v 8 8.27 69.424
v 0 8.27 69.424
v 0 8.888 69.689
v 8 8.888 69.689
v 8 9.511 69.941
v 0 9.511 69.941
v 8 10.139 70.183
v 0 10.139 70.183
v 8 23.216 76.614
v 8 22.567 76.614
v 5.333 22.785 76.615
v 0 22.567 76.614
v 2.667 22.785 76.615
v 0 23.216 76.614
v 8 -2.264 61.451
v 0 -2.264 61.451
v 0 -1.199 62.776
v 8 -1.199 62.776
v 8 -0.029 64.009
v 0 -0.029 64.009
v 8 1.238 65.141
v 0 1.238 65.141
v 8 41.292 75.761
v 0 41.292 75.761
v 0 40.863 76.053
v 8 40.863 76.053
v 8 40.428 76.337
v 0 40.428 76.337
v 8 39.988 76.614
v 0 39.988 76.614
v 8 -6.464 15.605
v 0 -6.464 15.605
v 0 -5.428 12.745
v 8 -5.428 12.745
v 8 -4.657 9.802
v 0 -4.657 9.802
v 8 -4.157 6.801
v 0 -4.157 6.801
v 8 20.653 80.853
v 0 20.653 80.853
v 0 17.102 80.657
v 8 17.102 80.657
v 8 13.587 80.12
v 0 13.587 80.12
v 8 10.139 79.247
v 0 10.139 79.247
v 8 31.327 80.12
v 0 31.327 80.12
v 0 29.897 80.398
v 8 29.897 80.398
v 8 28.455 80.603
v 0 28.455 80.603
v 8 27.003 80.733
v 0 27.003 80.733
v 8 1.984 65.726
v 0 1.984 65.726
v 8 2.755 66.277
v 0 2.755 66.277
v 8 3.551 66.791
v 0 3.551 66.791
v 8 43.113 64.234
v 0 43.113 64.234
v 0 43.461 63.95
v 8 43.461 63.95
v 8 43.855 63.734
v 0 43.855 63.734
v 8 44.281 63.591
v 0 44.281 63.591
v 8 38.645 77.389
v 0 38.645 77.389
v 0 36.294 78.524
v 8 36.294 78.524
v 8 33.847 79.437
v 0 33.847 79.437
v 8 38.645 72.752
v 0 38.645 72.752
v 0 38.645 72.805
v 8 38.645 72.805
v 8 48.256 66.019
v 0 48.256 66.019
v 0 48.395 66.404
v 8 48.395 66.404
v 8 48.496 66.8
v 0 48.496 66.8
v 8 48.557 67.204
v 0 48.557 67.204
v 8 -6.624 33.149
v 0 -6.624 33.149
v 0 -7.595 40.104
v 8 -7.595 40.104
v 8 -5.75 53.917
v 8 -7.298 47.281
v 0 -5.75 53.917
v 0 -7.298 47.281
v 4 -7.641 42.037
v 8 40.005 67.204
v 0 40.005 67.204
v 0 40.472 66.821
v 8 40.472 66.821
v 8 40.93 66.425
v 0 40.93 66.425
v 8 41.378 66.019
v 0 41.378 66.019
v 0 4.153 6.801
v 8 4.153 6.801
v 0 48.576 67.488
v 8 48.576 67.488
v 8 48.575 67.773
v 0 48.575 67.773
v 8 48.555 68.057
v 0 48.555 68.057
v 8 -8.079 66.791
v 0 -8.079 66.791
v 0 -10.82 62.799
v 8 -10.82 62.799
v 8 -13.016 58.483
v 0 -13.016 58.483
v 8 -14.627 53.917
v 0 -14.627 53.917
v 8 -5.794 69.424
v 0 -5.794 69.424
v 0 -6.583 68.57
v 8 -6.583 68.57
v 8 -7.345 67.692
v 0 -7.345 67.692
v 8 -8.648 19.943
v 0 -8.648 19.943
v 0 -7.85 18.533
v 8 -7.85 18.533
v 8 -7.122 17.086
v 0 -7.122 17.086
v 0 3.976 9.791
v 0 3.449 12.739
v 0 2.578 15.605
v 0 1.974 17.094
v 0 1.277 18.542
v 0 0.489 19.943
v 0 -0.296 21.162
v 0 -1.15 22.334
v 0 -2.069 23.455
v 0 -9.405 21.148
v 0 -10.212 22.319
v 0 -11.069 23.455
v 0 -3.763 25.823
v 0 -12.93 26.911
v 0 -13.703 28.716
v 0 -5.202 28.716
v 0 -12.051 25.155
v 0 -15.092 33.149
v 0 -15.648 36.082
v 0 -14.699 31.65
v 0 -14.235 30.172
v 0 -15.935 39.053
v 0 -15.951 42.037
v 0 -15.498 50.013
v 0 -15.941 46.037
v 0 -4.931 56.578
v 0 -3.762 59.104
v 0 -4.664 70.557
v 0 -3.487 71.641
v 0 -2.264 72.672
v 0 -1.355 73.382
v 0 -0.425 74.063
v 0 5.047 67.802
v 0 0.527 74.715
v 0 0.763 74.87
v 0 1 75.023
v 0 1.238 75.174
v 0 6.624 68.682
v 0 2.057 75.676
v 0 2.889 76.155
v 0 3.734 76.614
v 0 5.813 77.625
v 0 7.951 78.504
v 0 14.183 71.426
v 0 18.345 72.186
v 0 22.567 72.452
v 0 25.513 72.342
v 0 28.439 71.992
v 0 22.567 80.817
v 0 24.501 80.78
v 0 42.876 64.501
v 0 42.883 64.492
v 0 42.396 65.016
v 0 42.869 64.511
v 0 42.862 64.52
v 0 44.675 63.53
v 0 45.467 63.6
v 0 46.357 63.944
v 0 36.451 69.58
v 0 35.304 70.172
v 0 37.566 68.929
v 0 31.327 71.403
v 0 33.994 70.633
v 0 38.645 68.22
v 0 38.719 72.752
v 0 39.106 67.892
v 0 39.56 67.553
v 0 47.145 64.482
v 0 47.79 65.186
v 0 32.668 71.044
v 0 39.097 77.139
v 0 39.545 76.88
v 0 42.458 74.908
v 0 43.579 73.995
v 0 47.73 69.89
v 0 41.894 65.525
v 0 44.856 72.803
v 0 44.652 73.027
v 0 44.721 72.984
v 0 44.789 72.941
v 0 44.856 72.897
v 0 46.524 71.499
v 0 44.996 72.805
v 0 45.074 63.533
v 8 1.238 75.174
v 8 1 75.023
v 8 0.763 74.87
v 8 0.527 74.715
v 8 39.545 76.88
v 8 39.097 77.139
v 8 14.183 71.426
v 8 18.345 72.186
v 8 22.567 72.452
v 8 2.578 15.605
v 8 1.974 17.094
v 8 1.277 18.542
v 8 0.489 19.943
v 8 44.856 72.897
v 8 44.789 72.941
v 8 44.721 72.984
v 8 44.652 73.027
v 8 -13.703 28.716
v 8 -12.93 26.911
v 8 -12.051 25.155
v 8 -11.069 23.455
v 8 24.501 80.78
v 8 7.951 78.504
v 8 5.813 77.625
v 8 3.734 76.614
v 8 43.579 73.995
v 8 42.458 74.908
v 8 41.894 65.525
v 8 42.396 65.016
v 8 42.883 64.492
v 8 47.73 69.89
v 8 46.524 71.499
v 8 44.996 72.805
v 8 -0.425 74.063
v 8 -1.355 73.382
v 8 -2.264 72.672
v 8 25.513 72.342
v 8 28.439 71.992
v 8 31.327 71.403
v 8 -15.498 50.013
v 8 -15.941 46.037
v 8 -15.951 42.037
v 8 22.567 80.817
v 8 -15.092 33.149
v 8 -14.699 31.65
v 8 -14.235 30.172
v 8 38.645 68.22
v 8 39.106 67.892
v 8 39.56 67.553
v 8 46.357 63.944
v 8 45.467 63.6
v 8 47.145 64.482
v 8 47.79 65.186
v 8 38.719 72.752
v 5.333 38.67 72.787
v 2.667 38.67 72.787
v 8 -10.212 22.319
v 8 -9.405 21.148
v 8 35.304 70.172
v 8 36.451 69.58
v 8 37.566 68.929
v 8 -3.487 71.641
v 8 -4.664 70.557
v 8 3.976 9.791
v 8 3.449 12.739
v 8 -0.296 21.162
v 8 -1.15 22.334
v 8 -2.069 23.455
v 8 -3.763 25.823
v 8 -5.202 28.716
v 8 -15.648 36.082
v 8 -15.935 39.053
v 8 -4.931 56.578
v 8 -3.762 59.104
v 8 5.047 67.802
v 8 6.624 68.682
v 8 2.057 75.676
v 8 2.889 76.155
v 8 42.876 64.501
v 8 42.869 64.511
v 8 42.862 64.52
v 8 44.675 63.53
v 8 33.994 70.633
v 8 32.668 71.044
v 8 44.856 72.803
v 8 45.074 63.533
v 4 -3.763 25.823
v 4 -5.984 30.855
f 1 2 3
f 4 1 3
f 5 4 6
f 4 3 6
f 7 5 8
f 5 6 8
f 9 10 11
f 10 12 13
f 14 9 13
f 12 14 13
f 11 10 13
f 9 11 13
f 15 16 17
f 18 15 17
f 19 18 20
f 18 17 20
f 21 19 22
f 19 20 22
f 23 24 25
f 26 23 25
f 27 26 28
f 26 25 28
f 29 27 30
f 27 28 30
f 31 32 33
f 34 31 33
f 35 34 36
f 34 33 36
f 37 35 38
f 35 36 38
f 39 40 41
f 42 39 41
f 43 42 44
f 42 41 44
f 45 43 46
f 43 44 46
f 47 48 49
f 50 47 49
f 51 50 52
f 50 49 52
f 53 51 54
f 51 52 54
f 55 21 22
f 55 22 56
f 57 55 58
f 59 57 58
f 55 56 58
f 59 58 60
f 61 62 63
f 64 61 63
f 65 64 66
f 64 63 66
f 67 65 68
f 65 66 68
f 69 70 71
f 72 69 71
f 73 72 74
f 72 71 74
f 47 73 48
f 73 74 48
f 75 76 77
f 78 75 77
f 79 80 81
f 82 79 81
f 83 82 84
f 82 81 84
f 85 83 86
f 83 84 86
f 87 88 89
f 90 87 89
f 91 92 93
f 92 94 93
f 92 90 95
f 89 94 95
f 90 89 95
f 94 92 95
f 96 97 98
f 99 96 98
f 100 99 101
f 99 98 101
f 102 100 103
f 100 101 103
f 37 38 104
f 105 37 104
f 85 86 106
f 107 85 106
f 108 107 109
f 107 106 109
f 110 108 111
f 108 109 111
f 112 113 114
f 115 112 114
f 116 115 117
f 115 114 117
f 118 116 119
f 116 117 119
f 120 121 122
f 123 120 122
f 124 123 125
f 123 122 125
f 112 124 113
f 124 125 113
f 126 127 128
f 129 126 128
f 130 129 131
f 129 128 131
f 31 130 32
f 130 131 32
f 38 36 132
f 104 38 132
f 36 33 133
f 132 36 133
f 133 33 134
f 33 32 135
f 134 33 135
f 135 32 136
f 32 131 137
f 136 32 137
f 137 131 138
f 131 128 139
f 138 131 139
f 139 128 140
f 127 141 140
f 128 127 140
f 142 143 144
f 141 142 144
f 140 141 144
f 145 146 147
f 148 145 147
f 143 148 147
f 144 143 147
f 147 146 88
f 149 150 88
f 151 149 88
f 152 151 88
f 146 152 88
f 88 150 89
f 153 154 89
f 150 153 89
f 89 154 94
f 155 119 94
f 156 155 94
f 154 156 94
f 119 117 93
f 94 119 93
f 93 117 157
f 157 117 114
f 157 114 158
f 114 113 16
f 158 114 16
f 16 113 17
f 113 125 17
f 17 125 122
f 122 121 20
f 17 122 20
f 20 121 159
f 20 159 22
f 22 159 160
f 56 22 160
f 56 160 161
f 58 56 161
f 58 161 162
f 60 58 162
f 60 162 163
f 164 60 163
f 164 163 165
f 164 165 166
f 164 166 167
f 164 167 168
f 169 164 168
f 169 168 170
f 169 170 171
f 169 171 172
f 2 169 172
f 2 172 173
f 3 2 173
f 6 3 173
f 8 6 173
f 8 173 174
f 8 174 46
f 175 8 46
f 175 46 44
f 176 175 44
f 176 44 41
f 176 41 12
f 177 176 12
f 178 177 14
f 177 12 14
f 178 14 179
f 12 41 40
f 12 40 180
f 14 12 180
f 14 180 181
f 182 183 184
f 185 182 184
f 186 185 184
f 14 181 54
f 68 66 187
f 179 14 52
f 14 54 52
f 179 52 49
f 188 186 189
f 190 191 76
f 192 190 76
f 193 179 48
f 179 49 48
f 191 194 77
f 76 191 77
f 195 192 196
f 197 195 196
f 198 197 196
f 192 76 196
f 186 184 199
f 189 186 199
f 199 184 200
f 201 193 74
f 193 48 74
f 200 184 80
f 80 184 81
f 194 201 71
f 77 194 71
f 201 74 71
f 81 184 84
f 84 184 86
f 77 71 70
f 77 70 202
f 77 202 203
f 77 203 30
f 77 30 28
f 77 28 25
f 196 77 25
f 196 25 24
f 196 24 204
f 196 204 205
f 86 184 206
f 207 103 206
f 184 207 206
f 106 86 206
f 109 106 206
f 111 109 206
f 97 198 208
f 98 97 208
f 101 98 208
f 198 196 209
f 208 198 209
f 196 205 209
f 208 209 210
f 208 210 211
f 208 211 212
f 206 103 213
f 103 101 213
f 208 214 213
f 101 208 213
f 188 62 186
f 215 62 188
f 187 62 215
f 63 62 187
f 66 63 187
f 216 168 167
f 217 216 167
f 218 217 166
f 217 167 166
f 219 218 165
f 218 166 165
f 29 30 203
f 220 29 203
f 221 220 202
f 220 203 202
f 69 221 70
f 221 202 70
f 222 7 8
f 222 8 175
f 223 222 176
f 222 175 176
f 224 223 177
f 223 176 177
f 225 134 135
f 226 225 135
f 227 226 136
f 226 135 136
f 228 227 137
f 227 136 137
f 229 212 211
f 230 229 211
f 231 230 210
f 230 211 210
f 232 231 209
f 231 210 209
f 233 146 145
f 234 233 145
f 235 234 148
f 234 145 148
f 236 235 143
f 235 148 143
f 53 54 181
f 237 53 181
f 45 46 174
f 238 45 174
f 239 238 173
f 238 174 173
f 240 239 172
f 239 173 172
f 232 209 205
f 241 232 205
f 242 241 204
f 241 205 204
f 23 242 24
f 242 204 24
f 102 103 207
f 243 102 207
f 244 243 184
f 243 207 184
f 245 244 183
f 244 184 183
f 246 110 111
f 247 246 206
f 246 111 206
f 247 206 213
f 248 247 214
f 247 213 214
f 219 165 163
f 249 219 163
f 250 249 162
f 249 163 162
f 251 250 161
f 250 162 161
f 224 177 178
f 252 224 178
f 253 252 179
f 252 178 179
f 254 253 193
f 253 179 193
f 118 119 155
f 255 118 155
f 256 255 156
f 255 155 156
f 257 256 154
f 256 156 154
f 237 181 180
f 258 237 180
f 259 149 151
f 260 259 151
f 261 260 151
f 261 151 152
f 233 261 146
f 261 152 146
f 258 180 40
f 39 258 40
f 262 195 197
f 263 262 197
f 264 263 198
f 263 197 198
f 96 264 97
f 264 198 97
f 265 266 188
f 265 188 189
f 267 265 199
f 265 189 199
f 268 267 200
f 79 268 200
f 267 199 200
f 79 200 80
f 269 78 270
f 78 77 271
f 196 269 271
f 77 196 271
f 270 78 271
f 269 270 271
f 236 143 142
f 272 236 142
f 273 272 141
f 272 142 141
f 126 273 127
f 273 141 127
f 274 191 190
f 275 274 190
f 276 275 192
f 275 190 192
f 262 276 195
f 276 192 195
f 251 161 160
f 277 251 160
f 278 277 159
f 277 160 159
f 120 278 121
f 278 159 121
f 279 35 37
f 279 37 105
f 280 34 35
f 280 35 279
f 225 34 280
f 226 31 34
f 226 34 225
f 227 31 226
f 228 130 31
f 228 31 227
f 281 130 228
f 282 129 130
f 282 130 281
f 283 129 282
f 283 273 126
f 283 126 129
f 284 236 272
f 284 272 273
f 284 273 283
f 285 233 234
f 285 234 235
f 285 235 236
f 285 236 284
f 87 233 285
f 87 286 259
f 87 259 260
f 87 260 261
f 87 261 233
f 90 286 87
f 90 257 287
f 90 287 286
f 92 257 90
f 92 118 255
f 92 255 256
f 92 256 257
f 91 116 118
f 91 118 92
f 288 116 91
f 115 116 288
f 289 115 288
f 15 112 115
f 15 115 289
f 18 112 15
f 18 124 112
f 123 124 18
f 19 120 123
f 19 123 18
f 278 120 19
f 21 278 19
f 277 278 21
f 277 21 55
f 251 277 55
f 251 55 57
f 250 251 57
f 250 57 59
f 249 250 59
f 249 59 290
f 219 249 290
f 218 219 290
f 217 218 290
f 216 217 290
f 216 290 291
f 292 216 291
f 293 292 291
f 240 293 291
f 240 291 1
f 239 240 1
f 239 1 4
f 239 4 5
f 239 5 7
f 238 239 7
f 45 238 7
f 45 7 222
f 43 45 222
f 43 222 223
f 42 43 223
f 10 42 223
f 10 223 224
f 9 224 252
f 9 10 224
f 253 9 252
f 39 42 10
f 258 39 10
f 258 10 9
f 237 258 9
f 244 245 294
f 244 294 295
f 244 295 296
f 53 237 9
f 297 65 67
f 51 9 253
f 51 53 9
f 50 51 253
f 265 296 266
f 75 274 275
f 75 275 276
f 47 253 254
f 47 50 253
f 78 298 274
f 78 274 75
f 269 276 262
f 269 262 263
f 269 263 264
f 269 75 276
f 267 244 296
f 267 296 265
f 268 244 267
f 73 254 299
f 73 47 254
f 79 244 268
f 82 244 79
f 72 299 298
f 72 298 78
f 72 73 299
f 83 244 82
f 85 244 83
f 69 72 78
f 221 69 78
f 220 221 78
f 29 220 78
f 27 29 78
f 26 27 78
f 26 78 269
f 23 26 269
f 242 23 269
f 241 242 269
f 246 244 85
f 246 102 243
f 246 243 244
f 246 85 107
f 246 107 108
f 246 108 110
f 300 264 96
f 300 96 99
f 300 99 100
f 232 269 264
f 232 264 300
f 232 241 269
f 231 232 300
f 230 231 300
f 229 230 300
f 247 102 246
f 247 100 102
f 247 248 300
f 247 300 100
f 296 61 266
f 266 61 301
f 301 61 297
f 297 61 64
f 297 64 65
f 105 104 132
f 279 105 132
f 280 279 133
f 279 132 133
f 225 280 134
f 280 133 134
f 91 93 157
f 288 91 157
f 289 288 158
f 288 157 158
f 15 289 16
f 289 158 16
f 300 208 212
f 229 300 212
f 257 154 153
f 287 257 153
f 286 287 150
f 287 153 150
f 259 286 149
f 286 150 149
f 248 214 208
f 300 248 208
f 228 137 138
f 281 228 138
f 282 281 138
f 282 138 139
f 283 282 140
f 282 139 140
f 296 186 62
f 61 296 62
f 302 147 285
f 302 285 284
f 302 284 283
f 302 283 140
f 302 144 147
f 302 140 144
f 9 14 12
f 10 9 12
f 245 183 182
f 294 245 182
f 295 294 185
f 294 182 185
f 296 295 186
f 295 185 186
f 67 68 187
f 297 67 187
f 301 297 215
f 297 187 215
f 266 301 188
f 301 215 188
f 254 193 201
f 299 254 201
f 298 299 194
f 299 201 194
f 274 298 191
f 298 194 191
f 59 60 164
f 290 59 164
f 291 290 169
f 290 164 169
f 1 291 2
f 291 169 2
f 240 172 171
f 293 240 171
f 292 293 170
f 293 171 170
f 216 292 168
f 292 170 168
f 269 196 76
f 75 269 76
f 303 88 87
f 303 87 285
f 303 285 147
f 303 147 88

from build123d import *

# Parameters (mm, degrees)
F0_W     = 7.3179761397
F0_H     = 0.852221109
F2_DEPTH = 8


with BuildPart() as f2:
    # F0 (on Right) → F2 (new body)
    with BuildSketch(Plane.YZ):
        with BuildLine():
            Line((-10.1888944263, 53.9168607201), (-5.7503742038, 53.9168607201))
            ThreePointArc((-5.7503742038, 53.9168607201), (-4.3894384073, 57.8607093725), (-2.2639043723, 61.4507223949))
            Line((-2.2639043723, 61.4507223949), (-2.2639043723, 66.7907201963))
            add(Edge.make_bspline(
                [(-10.1888944263, 53.9168607201), (-8.3345715025, 58.6916164824), (-4.5405432149, 63.9948893867), (-2.2639043723, 66.7907201963)],
                knots=[0.4485191098, 0.4485191098, 0.4485191098, 0.4485191098, 0.5436368318, 0.5436368318, 0.5436368318, 0.5436368318], degree=3))
        make_face()
        with BuildLine():
            add(Edge.make_bspline(
                [(-5.7503742038, 53.9168607201), (-7.6414888716, 48.4947767316), (-7.6414888716, 42.0372994525)],
                knots=[4.1382491567, 4.1382491567, 4.1382491567, 4.7123889804, 4.7123889804, 4.7123889804], degree=2, weights=[1, 0.9590776261, 1]))
            Line((-5.7503742038, 53.9168607201), (-10.1888944263, 53.9168607201))
            add(Edge.make_bspline(
                [(-11.7964888716, 42.0372994525), (-11.953273607, 45.832214532), (-11.8401507048, 49.6649877966), (-10.1888944263, 53.9168607201)],
                knots=[0.3638177163, 0.3638177163, 0.3638177163, 0.3638177163, 0.4485191098, 0.4485191098, 0.4485191098, 0.4485191098], degree=3))
            Line((-11.7964888716, 42.0372994525), (-7.6414888716, 42.0372994525))
        make_face()
        with BuildLine():
            add(Edge.make_bspline(
                [(-7.6414888716, 42.0372994525), (-7.6414888716, 37.3930199427), (-6.6239046752, 33.1494348573)],
                knots=[4.7123889804, 4.7123889804, 4.7123889804, 5.1308312404, 5.1308312404, 5.1308312404], degree=2, weights=[1, 0.9781929812, 1]))
            Line((-7.6414888716, 42.0372994525), (-11.7964888716, 42.0372994525))
            add(Edge.make_bspline(
                [(-10.8578113303, 33.1494348573), (-11.3245159446, 35.5121547718), (-11.6611145328, 38.7606149052), (-11.7964888716, 42.0372994525)],
                knots=[0.2906830765, 0.2906830765, 0.2906830765, 0.2906830765, 0.3638177163, 0.3638177163, 0.3638177163, 0.3638177163], degree=3))
            Line((-10.8578113303, 33.1494348573), (-6.6239046752, 33.1494348573))
        make_face()
        with BuildLine():
            Line((-2.2639043723, 66.7907201963), (-2.2639043723, 61.4507223949))
            ThreePointArc((-2.2639043723, 61.4507223949), (-0.6270073096, 63.4042822038), (1.237973472, 65.1414277376))
            Line((1.237973472, 65.1414277376), (1.237973472, 66.7907201963))
            Line((1.237973472, 66.7907201963), (-2.2639043723, 66.7907201963))
        make_face()
        with BuildLine():
            add(Edge.make_bspline(
                [(-11.7964888716, 42.0372994525), (-11.953273607, 45.832214532), (-11.8401507048, 49.6649877966), (-10.1888944263, 53.9168607201)],
                knots=[0.3638177163, 0.3638177163, 0.3638177163, 0.3638177163, 0.4485191098, 0.4485191098, 0.4485191098, 0.4485191098], degree=3))
            Line((-10.1888944263, 53.9168607201), (-14.6274146488, 53.9168607201))
            ThreePointArc((-14.6274146488, 53.9168607201), (-15.7735164452, 48.0310330528), (-15.9514888716, 42.0372994525))
            Line((-15.9514888716, 42.0372994525), (-11.7964888716, 42.0372994525))
        make_face()
        with BuildLine():
            Line((-14.6274146488, 53.9168607201), (-10.1888944263, 53.9168607201))
            add(Edge.make_bspline(
                [(-10.1888944263, 53.9168607201), (-8.3345715025, 58.6916164824), (-4.5405432149, 63.9948893867), (-2.2639043723, 66.7907201963)],
                knots=[0.4485191098, 0.4485191098, 0.4485191098, 0.4485191098, 0.5436368318, 0.5436368318, 0.5436368318, 0.5436368318], degree=3))
            Line((-2.2639043723, 66.7907201963), (-8.0789732143, 66.7907201963))
            ThreePointArc((-8.0789732143, 66.7907201963), (-11.9890354693, 60.6772188038), (-14.6274146488, 53.9168607201))
        make_face()
        with BuildLine():
            add(Edge.make_bspline(
                [(-6.6239046752, 33.1494348573), (-6.0548250045, 30.7762277933), (-5.2018884672, 28.7161691389)],
                knots=[5.1308312404, 5.1308312404, 5.1308312404, 5.3672118342, 5.3672118342, 5.3672118342], degree=2, weights=[1, 0.9930236536, 1]))
            Line((-6.6239046752, 33.1494348573), (-10.8578113303, 33.1494348573))
            add(Edge.make_bspline(
                [(-9.4522823352, 28.7161691389), (-10.1167744763, 30.2015624686), (-10.5211448069, 31.4450405251), (-10.8578113303, 33.1494348573)],
                knots=[0.2379259703, 0.2379259703, 0.2379259703, 0.2379259703, 0.2906830765, 0.2906830765, 0.2906830765, 0.2906830765], degree=3))
            Line((-9.4522823352, 28.7161691389), (-5.2018884672, 28.7161691389))
        make_face()
        with BuildLine():
            add(Edge.make_bspline(
                [(-10.8578113303, 33.1494348573), (-11.3245159446, 35.5121547718), (-11.6611145328, 38.7606149052), (-11.7964888716, 42.0372994525)],
                knots=[0.2906830765, 0.2906830765, 0.2906830765, 0.2906830765, 0.3638177163, 0.3638177163, 0.3638177163, 0.3638177163], degree=3))
            Line((-11.7964888716, 42.0372994525), (-15.9514888716, 42.0372994525))
            ThreePointArc((-15.9514888716, 42.0372994525), (-15.825139965, 37.5640044352), (-15.0917179854, 33.1494348573))
            Line((-15.0917179854, 33.1494348573), (-10.8578113303, 33.1494348573))
        make_face()
        with BuildLine():
            Line((1.237973472, 66.7907201963), (1.237973472, 65.1414277376))
            ThreePointArc((1.237973472, 65.1414277376), (2.366186126, 66.0058819106), (3.5511644697, 66.7907201963))
            Line((3.5511644697, 66.7907201963), (1.237973472, 66.7907201963))
        make_face()
        with BuildLine():
            add(Edge.make_bspline(
                [(-2.2639043723, 66.7907201963), (-1.2992613055, 67.9753520122), (-0.6070401721, 68.7098144761), (0.2691752969, 69.4241264728)],
                knots=[0.5436368318, 0.5436368318, 0.5436368318, 0.5436368318, 0.5839395136, 0.5839395136, 0.5839395136, 0.5839395136], degree=3))
            Line((-2.2639043723, 66.7907201963), (1.237973472, 66.7907201963))
            Line((1.237973472, 66.7907201963), (1.237973472, 69.4241264728))
            Line((1.237973472, 69.4241264728), (0.2691752969, 69.4241264728))
        make_face()
        with BuildLine():
            Line((-8.0789732143, 66.7907201963), (-2.2639043723, 66.7907201963))
            Line((-2.2639043723, 66.7907201963), (-2.2639043723, 69.4241264728))
            Line((-2.2639043723, 69.4241264728), (-5.7937727942, 69.4241264728))
            ThreePointArc((-5.7937727942, 69.4241264728), (-6.9674844154, 68.1344209955), (-8.0789732143, 66.7907201963))
        make_face()
        with BuildLine():
            Line((-2.2639043723, 69.4241264728), (-2.2639043723, 66.7907201963))
            add(Edge.make_bspline(
                [(-2.2639043723, 66.7907201963), (-1.2992613055, 67.9753520122), (-0.6070401721, 68.7098144761), (0.2691752969, 69.4241264728)],
                knots=[0.5436368318, 0.5436368318, 0.5436368318, 0.5436368318, 0.5839395136, 0.5839395136, 0.5839395136, 0.5839395136], degree=3))
            Line((0.2691752969, 69.4241264728), (-2.2639043723, 69.4241264728))
        make_face()
        with BuildLine():
            add(Edge.make_bspline(
                [(-5.2018884672, 28.7161691389), (-3.8937096158, 25.55658452), (-2.0688837208, 23.4551739871)],
                knots=[5.3672118342, 5.3672118342, 5.3672118342, 5.727505896, 5.727505896, 5.727505896], degree=2, weights=[1, 0.9838173593, 1]))
            Line((-5.2018884672, 28.7161691389), (-9.4522823352, 28.7161691389))
            add(Edge.make_bspline(
                [(-6.5688837208, 23.4551739871), (-7.6073097342, 25.0299710332), (-8.6975714446, 27.0291025005), (-9.4522823352, 28.7161691389)],
                knots=[0.1780059801, 0.1780059801, 0.1780059801, 0.1780059801, 0.2379259703, 0.2379259703, 0.2379259703, 0.2379259703], degree=3))
            Line((-6.5688837208, 23.4551739871), (-2.0688837208, 23.4551739871))
        make_face()
        with BuildLine():
            add(Edge.make_bspline(
                [(-9.4522823352, 28.7161691389), (-10.1167744763, 30.2015624686), (-10.5211448069, 31.4450405251), (-10.8578113303, 33.1494348573)],
                knots=[0.2379259703, 0.2379259703, 0.2379259703, 0.2379259703, 0.2906830765, 0.2906830765, 0.2906830765, 0.2906830765], degree=3))
            Line((-10.8578113303, 33.1494348573), (-15.0917179854, 33.1494348573))
            ThreePointArc((-15.0917179854, 33.1494348573), (-14.475702404, 30.9082045202), (-13.7026762032, 28.7161691389))
            Line((-13.7026762032, 28.7161691389), (-9.4522823352, 28.7161691389))
        make_face()
        with BuildLine():
            Line((1.237973472, 66.7907201963), (3.5511644697, 66.7907201963))
            ThreePointArc((3.5511644697, 66.7907201963), (5.8260641015, 68.2586124131), (8.2697197383, 69.4241264728))
            Line((8.2697197383, 69.4241264728), (1.237973472, 69.4241264728))
            Line((1.237973472, 69.4241264728), (1.237973472, 66.7907201963))
        make_face()
        with BuildLine():
            Line((-2.2639043723, 72.6719278562), (-2.2639043723, 69.4241264728))
            Line((-2.2639043723, 69.4241264728), (0.2691752969, 69.4241264728))
            add(Edge.make_bspline(
                [(0.2691752969, 69.4241264728), (0.5652336546, 69.6654803909), (0.8822977177, 69.9045338318), (1.237973472, 70.1578745178)],
                knots=[0.5839395136, 0.5839395136, 0.5839395136, 0.5839395136, 0.5975571068, 0.5975571068, 0.5975571068, 0.5975571068], degree=3))
            Line((1.237973472, 70.1578745177), (1.237973472, 74.7149176101))
            Line((1.237973472, 74.7149176101), (0.5268579819, 74.7149176101))
            ThreePointArc((0.5268579819, 74.7149176101), (-0.8924649684, 73.7261276448), (-2.2639043723, 72.6719278562))
        make_face()
        with BuildLine():
            Line((-5.7937727942, 69.4241264728), (-2.2639043723, 69.4241264728))
            Line((-2.2639043723, 69.4241264728), (-2.2639043723, 72.6719278562))
            ThreePointArc((-2.2639043723, 72.6719278562), (-4.0816510588, 71.1054263302), (-5.7937727942, 69.4241264728))
        make_face()
        with BuildLine():
            add(Edge.make_bspline(
                [(0.2691752969, 69.4241264728), (0.5652336546, 69.6654803909), (0.8822977177, 69.9045338318), (1.237973472, 70.1578745178)],
                knots=[0.5839395136, 0.5839395136, 0.5839395136, 0.5839395136, 0.5975571068, 0.5975571068, 0.5975571068, 0.5975571068], degree=3))
            Line((0.2691752969, 69.4241264728), (1.237973472, 69.4241264728))
            Line((1.237973472, 69.4241264728), (1.237973472, 70.1578745177))
        make_face()
        with BuildLine():
            ThreePointArc((0.4889115668, 19.9429222314), (-0.7147477725, 21.7538403606), (-2.0688837208, 23.4551739871))
            Line((-2.0688837208, 23.4551739871), (-6.5688837208, 23.4551739871))
            add(Edge.make_bspline(
                [(-4.0796691275, 19.9429222314), (-4.8467986494, 21.0916706181), (-5.6892435404, 22.121179326), (-6.5688837208, 23.4551739871)],
                knots=[0.127248362, 0.127248362, 0.127248362, 0.127248362, 0.1780059801, 0.1780059801, 0.1780059801, 0.1780059801], degree=3))
            Line((-4.0796691275, 19.9429222314), (0.4889115668, 19.9429222314))
        make_face()
        with BuildLine():
            add(Edge.make_bspline(
                [(-6.5688837208, 23.4551739871), (-7.6073097342, 25.0299710332), (-8.6975714446, 27.0291025005), (-9.4522823352, 28.7161691389)],
                knots=[0.1780059801, 0.1780059801, 0.1780059801, 0.1780059801, 0.2379259703, 0.2379259703, 0.2379259703, 0.2379259703], degree=3))
            Line((-9.4522823352, 28.7161691389), (-13.7026762032, 28.7161691389))
            ThreePointArc((-13.7026762032, 28.7161691389), (-12.5038516774, 26.0265617582), (-11.0688837208, 23.4551739871))
            Line((-11.0688837208, 23.4551739871), (-6.5688837208, 23.4551739871))
        make_face()
        with BuildLine():
            Line((1.237973472, 69.4241264728), (8.2697197383, 69.4241264728))
            ThreePointArc((8.2697197383, 69.4241264728), (9.1992306977, 69.8164897066), (10.1393910192, 70.1826018489))
            Line((10.1393910192, 70.1826018489), (10.1393910192, 74.7149176101))
            add(Edge.make_bspline(
                [(1.237973472, 70.1578745178), (3.2585532739, 71.5970928701), (6.5252601055, 73.4974078941), (10.1393910192, 74.7149176101)],
                knots=[0.5975571068, 0.5975571068, 0.5975571068, 0.5975571068, 0.6749181117, 0.6749181117, 0.6749181117, 0.6749181117], degree=3))
            Line((1.237973472, 70.1578745177), (1.237973472, 69.4241264728))
        make_face()
        with BuildLine():
            Line((1.237973472, 74.7149176101), (1.237973472, 70.1578745177))
            add(Edge.make_bspline(
                [(1.237973472, 70.1578745178), (3.2585532739, 71.5970928701), (6.5252601055, 73.4974078941), (10.1393910192, 74.7149176101)],
                knots=[0.5975571068, 0.5975571068, 0.5975571068, 0.5975571068, 0.6749181117, 0.6749181117, 0.6749181117, 0.6749181117], degree=3))
            Line((10.1393910192, 74.7149176101), (1.237973472, 74.7149176101))
        make_face()
        with BuildLine():
            ThreePointArc((2.5784133808, 15.6048506081), (1.6366902241, 17.8235113891), (0.4889115668, 19.9429222314))
            Line((0.4889115668, 19.9429222314), (-4.0796691275, 19.9429222314))
            add(Edge.make_bspline(
                [(-1.9430062522, 15.6048506081), (-2.5381682165, 17.3739492027), (-3.2666174927, 18.7254071612), (-4.0796691275, 19.9429222314)],
                knots=[0.0734522777, 0.0734522777, 0.0734522777, 0.0734522777, 0.127248362, 0.127248362, 0.127248362, 0.127248362], degree=3))
            Line((-1.9430062522, 15.6048506081), (2.5784133808, 15.6048506081))
        make_face()
        with BuildLine():
            add(Edge.make_bspline(
                [(-4.0796691275, 19.9429222314), (-4.8467986494, 21.0916706181), (-5.6892435404, 22.121179326), (-6.5688837208, 23.4551739871)],
                knots=[0.127248362, 0.127248362, 0.127248362, 0.127248362, 0.1780059801, 0.1780059801, 0.1780059801, 0.1780059801], degree=3))
            Line((-6.5688837208, 23.4551739871), (-11.0688837208, 23.4551739871))
            ThreePointArc((-11.0688837208, 23.4551739871), (-9.80227604, 21.7378435208), (-8.6482498217, 19.9429222314))
            Line((-8.6482498217, 19.9429222314), (-4.0796691275, 19.9429222314))
        make_face()
        with BuildLine():
            Line((10.1393910192, 74.7149176101), (10.1393910192, 70.1826018489))
            ThreePointArc((10.1393910192, 70.1826018489), (16.2528045864, 71.8676558179), (22.5672341212, 72.4517893404))
            Line((22.5672341212, 72.4517893404), (22.5672341212, 76.6135193731))
            add(Edge.make_bspline(
                [(10.1393910192, 74.7149176101), (14.1917188378, 76.0800448315), (18.6808252051, 76.5867551297), (22.5672341212, 76.6135193731)],
                knots=[0.6749181117, 0.6749181117, 0.6749181117, 0.6749181117, 0.7616587859, 0.7616587859, 0.7616587859, 0.7616587859], degree=3))
        make_face()
        with BuildLine():
            ThreePointArc((1.237973472, 75.1743212979), (0.8810985763, 74.9466582845), (0.5268579819, 74.7149176101))
            Line((0.5268579819, 74.7149176101), (1.237973472, 74.7149176101))
            Line((1.237973472, 74.7149176101), (1.237973472, 75.1743212979))
        make_face()
        with BuildLine():
            Line((1.237973472, 75.1743212979), (1.237973472, 74.7149176101))
            Line((1.237973472, 74.7149176101), (10.1393910192, 74.7149176101))
            Line((10.1393910192, 74.7149176101), (10.1393910192, 76.6135193731))
            Line((10.1393910192, 76.6135193731), (3.7337425961, 76.6135193731))
            ThreePointArc((3.7337425961, 76.6135193731), (2.4718112827, 75.918279351), (1.237973472, 75.1743212979))
        make_face()
        with BuildLine():
            Line((10.1393910192, 76.6135193731), (10.1393910192, 74.7149176101))
            add(Edge.make_bspline(
                [(10.1393910192, 74.7149176101), (14.1917188378, 76.0800448315), (18.6808252051, 76.5867551297), (22.5672341212, 76.6135193731)],
                knots=[0.6749181117, 0.6749181117, 0.6749181117, 0.6749181117, 0.7616587859, 0.7616587859, 0.7616587859, 0.7616587859], degree=3))
            Line((22.5672341212, 76.6135193731), (10.1393910192, 76.6135193731))
        make_face()
        with BuildLine():
            ThreePointArc((4.152898933, 6.8011660784), (3.7561793875, 11.2728510531), (2.5784133808, 15.6048506081))
            Line((2.5784133808, 15.6048506081), (-1.9430062522, 15.6048506081))
            add(Edge.make_bspline(
                [(-0.002101067, 6.8011660784), (-0.5662415412, 9.9952594602), (-1.1303820154, 13.189352842), (-1.9430062522, 15.6048506081)],
                knots=[0, 0, 0, 0, 0.0734522777, 0.0734522777, 0.0734522777, 0.0734522777], degree=3))
            Line((-0.002101067, 6.8011660784), (4.152898933, 6.8011660784))
        make_face()
        with BuildLine():
            add(Edge.make_bspline(
                [(-1.9430062522, 15.6048506081), (-2.5381682165, 17.3739492027), (-3.2666174927, 18.7254071612), (-4.0796691275, 19.9429222314)],
                knots=[0.0734522777, 0.0734522777, 0.0734522777, 0.0734522777, 0.127248362, 0.127248362, 0.127248362, 0.127248362], degree=3))
            Line((-4.0796691275, 19.9429222314), (-8.6482498217, 19.9429222314))
            ThreePointArc((-8.6482498217, 19.9429222314), (-7.4771524819, 17.8137490419), (-6.4644258852, 15.6048506081))
            Line((-6.4644258852, 15.6048506081), (-1.9430062522, 15.6048506081))
        make_face()
        with BuildLine():
            Line((22.5672341212, 76.6135193731), (22.5672341212, 72.4517893404))
            ThreePointArc((22.5672341212, 72.4517893404), (26.9794357563, 72.1971647924), (31.3270061461, 71.4028168618))
            Line((31.3270061461, 71.4028168618), (31.3270061461, 72.690683065))
            Line((31.3270061461, 72.690683065), (31.3270061461, 75.761298264))
            add(Edge.make_bspline(
                [(23.2156569251, 76.6135193731), (26.1977321335, 76.5927510585), (28.8283393897, 76.2847039305), (31.3270061461, 75.761298264)],
                knots=[0.7665245528, 0.7665245528, 0.7665245528, 0.7665245528, 0.8342341594, 0.8342341594, 0.8342341594, 0.8342341594], degree=3))
            Line((23.2156569251, 76.6135193731), (22.5672341212, 76.6135193731))
        make_face()
        with BuildLine():
            Line((3.7337425961, 76.6135193731), (10.1393910192, 76.6135193731))
            Line((10.1393910192, 76.6135193731), (10.1393910192, 79.2472333713))
            ThreePointArc((10.1393910192, 79.2472333713), (6.8746578417, 78.0809496958), (3.7337425961, 76.6135193731))
        make_face()
        with BuildLine():
            Line((10.1393910192, 79.2472333713), (10.1393910192, 76.6135193731))
            Line((10.1393910192, 76.6135193731), (22.5672341212, 76.6135193731))
            Line((22.5672341212, 76.6135193731), (22.5672341212, 80.816700989))
            Line((22.5672341212, 80.816700989), (20.6527994041, 80.8529768738))
            ThreePointArc((20.6527994041, 80.8529768738), (15.3379592409, 80.4307432513), (10.1393910192, 79.2472333713))
        make_face()
        with BuildLine():
            Line((22.5672341212, 80.816700989), (22.5672341212, 76.6135193731))
            add(Edge.make_bspline(
                [(22.5672341212, 76.6135193731), (22.7852444149, 76.6150207283), (23.0013581932, 76.6150118316), (23.2156569251, 76.6135193731)],
                knots=[0.7616587859, 0.7616587859, 0.7616587859, 0.7616587859, 0.7665245528, 0.7665245528, 0.7665245528, 0.7665245528], degree=3))
            Line((23.2156569251, 76.6135193731), (31.3270061461, 76.6135193731))
            Line((31.3270061461, 76.6135193731), (31.3270061461, 80.1197796662))
            ThreePointArc((31.3270061461, 80.1197796662), (29.1770875592, 80.5100007635), (27.0034147385, 80.7326415141))
            Line((27.0034147385, 80.7326415141), (24.5007061931, 80.7800643727))
            Line((24.5007061931, 80.7800643727), (22.5672341212, 80.816700989))
        make_face()
        with BuildLine():
            add(Edge.make_bspline(
                [(-0.002101067, 6.8011660784), (-0.5662415412, 9.9952594602), (-1.1303820154, 13.189352842), (-1.9430062522, 15.6048506081)],
                knots=[0, 0, 0, 0, 0.0734522777, 0.0734522777, 0.0734522777, 0.0734522777], degree=3))
            Line((-1.9430062522, 15.6048506081), (-6.4644258852, 15.6048506081))
            ThreePointArc((-6.4644258852, 15.6048506081), (-5.008614741, 11.2821973774), (-4.157101067, 6.8011660784))
            Line((-4.157101067, 6.8011660784), (-0.002101067, 6.8011660784))
        make_face()
        with BuildLine():
            Line((31.3270061461, 72.690683065), (31.3270061461, 71.4028168618))
            ThreePointArc((31.3270061461, 71.4028168618), (33.333189747, 70.8449262382), (35.3036885535, 70.1717627798))
            ThreePointArc((35.3036885535, 70.1717627798), (37.0126027179, 69.2615348872), (38.6449822857, 68.2202667256))
            Line((38.6449822857, 68.2202667256), (38.6449822857, 72.7516210723))
            Line((38.6449822857, 72.7516210723), (31.3270061461, 72.690683065))
        make_face()
        with BuildLine():
            Line((31.3270061461, 76.6135193731), (23.2156569251, 76.6135193731))
            add(Edge.make_bspline(
                [(23.2156569251, 76.6135193731), (26.1977321335, 76.5927510585), (28.8283393897, 76.2847039305), (31.3270061461, 75.761298264)],
                knots=[0.7665245528, 0.7665245528, 0.7665245528, 0.7665245528, 0.8342341594, 0.8342341594, 0.8342341594, 0.8342341594], degree=3))
            Line((31.3270061461, 75.761298264), (31.3270061461, 76.6135193731))
        make_face()
        with BuildLine():
            Line((31.3270061461, 75.761298264), (31.3270061461, 72.690683065))
            Line((31.3270061461, 72.690683065), (38.6449822857, 72.7516210723))
            Line((38.6449822857, 72.7516210723), (38.6449822857, 72.804503681))
            add(Edge.make_bspline(
                [(31.3270061461, 75.761298264), (33.8632565179, 75.2300198081), (36.2635673813, 74.4768554728), (38.6449822857, 72.804503681)],
                knots=[0.8342341594, 0.8342341594, 0.8342341594, 0.8342341594, 0.9029622179, 0.9029622179, 0.9029622179, 0.9029622179], degree=3))
        make_face()
        with BuildLine():
            Line((31.3270061461, 80.1197796662), (31.3270061461, 76.6135193731))
            Line((31.3270061461, 76.6135193731), (38.6449822857, 76.6135193731))
            Line((38.6449822857, 76.6135193731), (38.6449822857, 77.3887406365))
            ThreePointArc((38.6449822857, 77.3887406365), (35.0809806575, 79.0087817843), (31.3270061461, 80.1197796662))
        make_face()
        with Locations((34.9859942159, 76.1874088185)):
            Rectangle(F0_W, F0_H)
        with BuildLine():
            Line((38.6449822857, 75.761298264), (31.3270061461, 75.761298264))
            add(Edge.make_bspline(
                [(31.3270061461, 75.761298264), (33.8632565179, 75.2300198081), (36.2635673813, 74.4768554728), (38.6449822857, 72.804503681)],
                knots=[0.8342341594, 0.8342341594, 0.8342341594, 0.8342341594, 0.9029622179, 0.9029622179, 0.9029622179, 0.9029622179], degree=3))
            Line((38.6449822857, 72.804503681), (38.6449822857, 75.761298264))
        make_face()
        with BuildLine():
            Line((38.6449822857, 72.7516210723), (38.6449822857, 68.2202667256))
            ThreePointArc((38.6449822857, 68.2202667256), (39.3339273149, 67.7240475044), (40.0054134636, 67.2044465799))
            Line((40.0054134636, 67.2044465799), (44.2810582439, 67.2044465799))
            add(Edge.make_bspline(
                [(38.7189835451, 72.7522372931), (41.0830829077, 71.0729861649), (43.413637043, 68.5097934745), (44.2810582439, 67.2044465799)],
                knots=[0.9036741885, 0.9036741885, 0.9036741885, 0.9036741885, 0.9719182271, 0.9719182271, 0.9719182271, 0.9719182271], degree=3))
            Line((38.7189835451, 72.7522372931), (38.6449822857, 72.7516210723))
        make_face()
        with BuildLine():
            Line((38.6449822857, 77.3887406365), (38.6449822857, 76.6135193731))
            Line((38.6449822857, 76.6135193731), (39.9877868127, 76.6135193731))
            ThreePointArc((39.9877868127, 76.6135193731), (39.3217119492, 77.010357895), (38.6449822857, 77.3887406365))
        make_face()
        with BuildLine():
            Line((39.9877868127, 76.6135193731), (38.6449822857, 76.6135193731))
            Line((38.6449822857, 76.6135193731), (38.6449822857, 75.761298264))
            Line((38.6449822857, 75.761298264), (41.2922999092, 75.761298264))
            ThreePointArc((41.2922999092, 75.761298264), (40.6459290143, 76.1964181141), (39.9877868127, 76.6135193731))
        make_face()
        with BuildLine():
            Line((41.2922999092, 75.761298264), (38.6449822857, 75.761298264))
            Line((38.6449822857, 75.761298264), (38.6449822857, 72.804503681))
            add(Edge.make_bspline(
                [(38.6449822857, 72.804503681), (38.6696519411, 72.7871793827), (38.6943195687, 72.7697564427), (38.7189835451, 72.7522372931)],
                knots=[0.9029622179, 0.9029622179, 0.9029622179, 0.9029622179, 0.9036741885, 0.9036741885, 0.9036741885, 0.9036741885], degree=3))
            Line((38.7189835451, 72.7522372931), (44.8563766883, 72.803344389))
            Line((44.8563766883, 72.803344389), (44.8563766883, 72.8972181129))
            ThreePointArc((44.8563766883, 72.8972181129), (44.7546139615, 72.9626942681), (44.6519926928, 73.0268164536))
            ThreePointArc((44.6519926928, 73.0268164536), (43.0247143735, 74.4586445772), (41.2922999092, 75.761298264))
        make_face()
        with BuildLine():
            Line((44.2810582439, 67.2044465799), (40.0054134636, 67.2044465799))
            ThreePointArc((40.0054134636, 67.2044465799), (40.7024608637, 66.6243204625), (41.3777458899, 66.0190011059))
            Line((41.3777458899, 66.0190011059), (44.2810582439, 66.0190011059))
            Line((44.2810582439, 66.0190011059), (44.2810582439, 67.2044465799))
        make_face()
        with BuildLine():
            Line((44.8563766883, 72.803344389), (38.7189835451, 72.7522372931))
            add(Edge.make_bspline(
                [(38.7189835451, 72.7522372931), (41.0830829077, 71.0729861649), (43.413637043, 68.5097934745), (44.2810582439, 67.2044465799)],
                knots=[0.9036741885, 0.9036741885, 0.9036741885, 0.9036741885, 0.9719182271, 0.9719182271, 0.9719182271, 0.9719182271], degree=3))
            Line((44.2810582439, 67.2044465799), (44.8563766883, 67.2044465799))
            Line((44.8563766883, 67.2044465799), (44.8563766883, 72.803344389))
        make_face()
        with BuildLine():
            Line((44.2810582439, 66.0190011059), (41.3777458899, 66.0190011059))
            ThreePointArc((41.3777458899, 66.0190011059), (42.1468438935, 65.2719221816), (42.8828000164, 64.4921739894))
            ThreePointArc((42.8828000164, 64.4921739894), (42.8721611441, 64.5060256939), (42.8616194891, 64.5199515271))
            Line((42.8616194891, 64.5199515271), (43.1128631572, 64.2339614732))
            ThreePointArc((43.1128631572, 64.2339614732), (43.653215449, 63.8329981426), (44.2810582439, 63.5909948022))
            Line((44.2810582439, 63.5909948022), (44.2810582439, 66.0190011059))
        make_face()
        with BuildLine():
            add(Edge.make_bspline(
                [(44.2810582439, 67.2044465799), (44.63799382, 66.667308745), (44.7471852541, 66.3431549254), (44.8563766883, 66.0190011059)],
                knots=[0.9719182271, 0.9719182271, 0.9719182271, 0.9719182271, 1, 1, 1, 1], degree=3))
            Line((44.2810582439, 67.2044465799), (44.2810582439, 66.0190011059))
            Line((44.2810582439, 66.0190011059), (44.8563766883, 66.0190011059))
        make_face()
        with BuildLine():
            Line((44.8563766883, 67.2044465799), (44.2810582439, 67.2044465799))
            add(Edge.make_bspline(
                [(44.2810582439, 67.2044465799), (44.63799382, 66.667308745), (44.7471852541, 66.3431549254), (44.8563766883, 66.0190011059)],
                knots=[0.9719182271, 0.9719182271, 0.9719182271, 0.9719182271, 1, 1, 1, 1], degree=3))
            Line((44.8563766883, 66.0190011059), (44.8563766883, 67.2044465799))
        make_face()
        with BuildLine():
            Line((44.995594754, 72.804503681), (44.8563766883, 72.803344389))
            Line((44.8563766883, 72.803344389), (44.8563766883, 67.2044465799))
            Line((44.8563766883, 67.2044465799), (48.5567030241, 67.2044465799))
            ThreePointArc((48.5567030241, 67.2044465799), (48.5776505922, 67.6306605106), (48.5547722523, 68.0567751628))
            ThreePointArc((48.5547722523, 68.0567751628), (47.1714888934, 70.7277333316), (44.995594754, 72.804503681))
        make_face()
        with BuildLine():
            Line((44.8563766883, 66.0190011059), (44.2810582439, 66.0190011059))
            Line((44.2810582439, 66.0190011059), (44.2810582439, 63.5909948022))
            ThreePointArc((44.2810582439, 63.5909948022), (44.8744379473, 63.5238298264), (45.4667831786, 63.5995776539))
            ThreePointArc((45.4667831786, 63.5995776539), (47.1450780919, 64.4823835606), (48.2563056132, 66.0190011059))
            Line((48.2563056132, 66.0190011059), (44.8563766883, 66.0190011059))
        make_face()
        with BuildLine():
            Line((48.5567030241, 67.2044465799), (44.8563766883, 67.2044465799))
            Line((44.8563766883, 67.2044465799), (44.8563766883, 66.0190011059))
            Line((44.8563766883, 66.0190011059), (48.2563056132, 66.0190011059))
            ThreePointArc((48.2563056132, 66.0190011059), (48.4503561043, 66.6006115959), (48.5567030241, 67.2044465799))
        make_face()
    extrude(amount=F2_DEPTH)


solid = f2.part
